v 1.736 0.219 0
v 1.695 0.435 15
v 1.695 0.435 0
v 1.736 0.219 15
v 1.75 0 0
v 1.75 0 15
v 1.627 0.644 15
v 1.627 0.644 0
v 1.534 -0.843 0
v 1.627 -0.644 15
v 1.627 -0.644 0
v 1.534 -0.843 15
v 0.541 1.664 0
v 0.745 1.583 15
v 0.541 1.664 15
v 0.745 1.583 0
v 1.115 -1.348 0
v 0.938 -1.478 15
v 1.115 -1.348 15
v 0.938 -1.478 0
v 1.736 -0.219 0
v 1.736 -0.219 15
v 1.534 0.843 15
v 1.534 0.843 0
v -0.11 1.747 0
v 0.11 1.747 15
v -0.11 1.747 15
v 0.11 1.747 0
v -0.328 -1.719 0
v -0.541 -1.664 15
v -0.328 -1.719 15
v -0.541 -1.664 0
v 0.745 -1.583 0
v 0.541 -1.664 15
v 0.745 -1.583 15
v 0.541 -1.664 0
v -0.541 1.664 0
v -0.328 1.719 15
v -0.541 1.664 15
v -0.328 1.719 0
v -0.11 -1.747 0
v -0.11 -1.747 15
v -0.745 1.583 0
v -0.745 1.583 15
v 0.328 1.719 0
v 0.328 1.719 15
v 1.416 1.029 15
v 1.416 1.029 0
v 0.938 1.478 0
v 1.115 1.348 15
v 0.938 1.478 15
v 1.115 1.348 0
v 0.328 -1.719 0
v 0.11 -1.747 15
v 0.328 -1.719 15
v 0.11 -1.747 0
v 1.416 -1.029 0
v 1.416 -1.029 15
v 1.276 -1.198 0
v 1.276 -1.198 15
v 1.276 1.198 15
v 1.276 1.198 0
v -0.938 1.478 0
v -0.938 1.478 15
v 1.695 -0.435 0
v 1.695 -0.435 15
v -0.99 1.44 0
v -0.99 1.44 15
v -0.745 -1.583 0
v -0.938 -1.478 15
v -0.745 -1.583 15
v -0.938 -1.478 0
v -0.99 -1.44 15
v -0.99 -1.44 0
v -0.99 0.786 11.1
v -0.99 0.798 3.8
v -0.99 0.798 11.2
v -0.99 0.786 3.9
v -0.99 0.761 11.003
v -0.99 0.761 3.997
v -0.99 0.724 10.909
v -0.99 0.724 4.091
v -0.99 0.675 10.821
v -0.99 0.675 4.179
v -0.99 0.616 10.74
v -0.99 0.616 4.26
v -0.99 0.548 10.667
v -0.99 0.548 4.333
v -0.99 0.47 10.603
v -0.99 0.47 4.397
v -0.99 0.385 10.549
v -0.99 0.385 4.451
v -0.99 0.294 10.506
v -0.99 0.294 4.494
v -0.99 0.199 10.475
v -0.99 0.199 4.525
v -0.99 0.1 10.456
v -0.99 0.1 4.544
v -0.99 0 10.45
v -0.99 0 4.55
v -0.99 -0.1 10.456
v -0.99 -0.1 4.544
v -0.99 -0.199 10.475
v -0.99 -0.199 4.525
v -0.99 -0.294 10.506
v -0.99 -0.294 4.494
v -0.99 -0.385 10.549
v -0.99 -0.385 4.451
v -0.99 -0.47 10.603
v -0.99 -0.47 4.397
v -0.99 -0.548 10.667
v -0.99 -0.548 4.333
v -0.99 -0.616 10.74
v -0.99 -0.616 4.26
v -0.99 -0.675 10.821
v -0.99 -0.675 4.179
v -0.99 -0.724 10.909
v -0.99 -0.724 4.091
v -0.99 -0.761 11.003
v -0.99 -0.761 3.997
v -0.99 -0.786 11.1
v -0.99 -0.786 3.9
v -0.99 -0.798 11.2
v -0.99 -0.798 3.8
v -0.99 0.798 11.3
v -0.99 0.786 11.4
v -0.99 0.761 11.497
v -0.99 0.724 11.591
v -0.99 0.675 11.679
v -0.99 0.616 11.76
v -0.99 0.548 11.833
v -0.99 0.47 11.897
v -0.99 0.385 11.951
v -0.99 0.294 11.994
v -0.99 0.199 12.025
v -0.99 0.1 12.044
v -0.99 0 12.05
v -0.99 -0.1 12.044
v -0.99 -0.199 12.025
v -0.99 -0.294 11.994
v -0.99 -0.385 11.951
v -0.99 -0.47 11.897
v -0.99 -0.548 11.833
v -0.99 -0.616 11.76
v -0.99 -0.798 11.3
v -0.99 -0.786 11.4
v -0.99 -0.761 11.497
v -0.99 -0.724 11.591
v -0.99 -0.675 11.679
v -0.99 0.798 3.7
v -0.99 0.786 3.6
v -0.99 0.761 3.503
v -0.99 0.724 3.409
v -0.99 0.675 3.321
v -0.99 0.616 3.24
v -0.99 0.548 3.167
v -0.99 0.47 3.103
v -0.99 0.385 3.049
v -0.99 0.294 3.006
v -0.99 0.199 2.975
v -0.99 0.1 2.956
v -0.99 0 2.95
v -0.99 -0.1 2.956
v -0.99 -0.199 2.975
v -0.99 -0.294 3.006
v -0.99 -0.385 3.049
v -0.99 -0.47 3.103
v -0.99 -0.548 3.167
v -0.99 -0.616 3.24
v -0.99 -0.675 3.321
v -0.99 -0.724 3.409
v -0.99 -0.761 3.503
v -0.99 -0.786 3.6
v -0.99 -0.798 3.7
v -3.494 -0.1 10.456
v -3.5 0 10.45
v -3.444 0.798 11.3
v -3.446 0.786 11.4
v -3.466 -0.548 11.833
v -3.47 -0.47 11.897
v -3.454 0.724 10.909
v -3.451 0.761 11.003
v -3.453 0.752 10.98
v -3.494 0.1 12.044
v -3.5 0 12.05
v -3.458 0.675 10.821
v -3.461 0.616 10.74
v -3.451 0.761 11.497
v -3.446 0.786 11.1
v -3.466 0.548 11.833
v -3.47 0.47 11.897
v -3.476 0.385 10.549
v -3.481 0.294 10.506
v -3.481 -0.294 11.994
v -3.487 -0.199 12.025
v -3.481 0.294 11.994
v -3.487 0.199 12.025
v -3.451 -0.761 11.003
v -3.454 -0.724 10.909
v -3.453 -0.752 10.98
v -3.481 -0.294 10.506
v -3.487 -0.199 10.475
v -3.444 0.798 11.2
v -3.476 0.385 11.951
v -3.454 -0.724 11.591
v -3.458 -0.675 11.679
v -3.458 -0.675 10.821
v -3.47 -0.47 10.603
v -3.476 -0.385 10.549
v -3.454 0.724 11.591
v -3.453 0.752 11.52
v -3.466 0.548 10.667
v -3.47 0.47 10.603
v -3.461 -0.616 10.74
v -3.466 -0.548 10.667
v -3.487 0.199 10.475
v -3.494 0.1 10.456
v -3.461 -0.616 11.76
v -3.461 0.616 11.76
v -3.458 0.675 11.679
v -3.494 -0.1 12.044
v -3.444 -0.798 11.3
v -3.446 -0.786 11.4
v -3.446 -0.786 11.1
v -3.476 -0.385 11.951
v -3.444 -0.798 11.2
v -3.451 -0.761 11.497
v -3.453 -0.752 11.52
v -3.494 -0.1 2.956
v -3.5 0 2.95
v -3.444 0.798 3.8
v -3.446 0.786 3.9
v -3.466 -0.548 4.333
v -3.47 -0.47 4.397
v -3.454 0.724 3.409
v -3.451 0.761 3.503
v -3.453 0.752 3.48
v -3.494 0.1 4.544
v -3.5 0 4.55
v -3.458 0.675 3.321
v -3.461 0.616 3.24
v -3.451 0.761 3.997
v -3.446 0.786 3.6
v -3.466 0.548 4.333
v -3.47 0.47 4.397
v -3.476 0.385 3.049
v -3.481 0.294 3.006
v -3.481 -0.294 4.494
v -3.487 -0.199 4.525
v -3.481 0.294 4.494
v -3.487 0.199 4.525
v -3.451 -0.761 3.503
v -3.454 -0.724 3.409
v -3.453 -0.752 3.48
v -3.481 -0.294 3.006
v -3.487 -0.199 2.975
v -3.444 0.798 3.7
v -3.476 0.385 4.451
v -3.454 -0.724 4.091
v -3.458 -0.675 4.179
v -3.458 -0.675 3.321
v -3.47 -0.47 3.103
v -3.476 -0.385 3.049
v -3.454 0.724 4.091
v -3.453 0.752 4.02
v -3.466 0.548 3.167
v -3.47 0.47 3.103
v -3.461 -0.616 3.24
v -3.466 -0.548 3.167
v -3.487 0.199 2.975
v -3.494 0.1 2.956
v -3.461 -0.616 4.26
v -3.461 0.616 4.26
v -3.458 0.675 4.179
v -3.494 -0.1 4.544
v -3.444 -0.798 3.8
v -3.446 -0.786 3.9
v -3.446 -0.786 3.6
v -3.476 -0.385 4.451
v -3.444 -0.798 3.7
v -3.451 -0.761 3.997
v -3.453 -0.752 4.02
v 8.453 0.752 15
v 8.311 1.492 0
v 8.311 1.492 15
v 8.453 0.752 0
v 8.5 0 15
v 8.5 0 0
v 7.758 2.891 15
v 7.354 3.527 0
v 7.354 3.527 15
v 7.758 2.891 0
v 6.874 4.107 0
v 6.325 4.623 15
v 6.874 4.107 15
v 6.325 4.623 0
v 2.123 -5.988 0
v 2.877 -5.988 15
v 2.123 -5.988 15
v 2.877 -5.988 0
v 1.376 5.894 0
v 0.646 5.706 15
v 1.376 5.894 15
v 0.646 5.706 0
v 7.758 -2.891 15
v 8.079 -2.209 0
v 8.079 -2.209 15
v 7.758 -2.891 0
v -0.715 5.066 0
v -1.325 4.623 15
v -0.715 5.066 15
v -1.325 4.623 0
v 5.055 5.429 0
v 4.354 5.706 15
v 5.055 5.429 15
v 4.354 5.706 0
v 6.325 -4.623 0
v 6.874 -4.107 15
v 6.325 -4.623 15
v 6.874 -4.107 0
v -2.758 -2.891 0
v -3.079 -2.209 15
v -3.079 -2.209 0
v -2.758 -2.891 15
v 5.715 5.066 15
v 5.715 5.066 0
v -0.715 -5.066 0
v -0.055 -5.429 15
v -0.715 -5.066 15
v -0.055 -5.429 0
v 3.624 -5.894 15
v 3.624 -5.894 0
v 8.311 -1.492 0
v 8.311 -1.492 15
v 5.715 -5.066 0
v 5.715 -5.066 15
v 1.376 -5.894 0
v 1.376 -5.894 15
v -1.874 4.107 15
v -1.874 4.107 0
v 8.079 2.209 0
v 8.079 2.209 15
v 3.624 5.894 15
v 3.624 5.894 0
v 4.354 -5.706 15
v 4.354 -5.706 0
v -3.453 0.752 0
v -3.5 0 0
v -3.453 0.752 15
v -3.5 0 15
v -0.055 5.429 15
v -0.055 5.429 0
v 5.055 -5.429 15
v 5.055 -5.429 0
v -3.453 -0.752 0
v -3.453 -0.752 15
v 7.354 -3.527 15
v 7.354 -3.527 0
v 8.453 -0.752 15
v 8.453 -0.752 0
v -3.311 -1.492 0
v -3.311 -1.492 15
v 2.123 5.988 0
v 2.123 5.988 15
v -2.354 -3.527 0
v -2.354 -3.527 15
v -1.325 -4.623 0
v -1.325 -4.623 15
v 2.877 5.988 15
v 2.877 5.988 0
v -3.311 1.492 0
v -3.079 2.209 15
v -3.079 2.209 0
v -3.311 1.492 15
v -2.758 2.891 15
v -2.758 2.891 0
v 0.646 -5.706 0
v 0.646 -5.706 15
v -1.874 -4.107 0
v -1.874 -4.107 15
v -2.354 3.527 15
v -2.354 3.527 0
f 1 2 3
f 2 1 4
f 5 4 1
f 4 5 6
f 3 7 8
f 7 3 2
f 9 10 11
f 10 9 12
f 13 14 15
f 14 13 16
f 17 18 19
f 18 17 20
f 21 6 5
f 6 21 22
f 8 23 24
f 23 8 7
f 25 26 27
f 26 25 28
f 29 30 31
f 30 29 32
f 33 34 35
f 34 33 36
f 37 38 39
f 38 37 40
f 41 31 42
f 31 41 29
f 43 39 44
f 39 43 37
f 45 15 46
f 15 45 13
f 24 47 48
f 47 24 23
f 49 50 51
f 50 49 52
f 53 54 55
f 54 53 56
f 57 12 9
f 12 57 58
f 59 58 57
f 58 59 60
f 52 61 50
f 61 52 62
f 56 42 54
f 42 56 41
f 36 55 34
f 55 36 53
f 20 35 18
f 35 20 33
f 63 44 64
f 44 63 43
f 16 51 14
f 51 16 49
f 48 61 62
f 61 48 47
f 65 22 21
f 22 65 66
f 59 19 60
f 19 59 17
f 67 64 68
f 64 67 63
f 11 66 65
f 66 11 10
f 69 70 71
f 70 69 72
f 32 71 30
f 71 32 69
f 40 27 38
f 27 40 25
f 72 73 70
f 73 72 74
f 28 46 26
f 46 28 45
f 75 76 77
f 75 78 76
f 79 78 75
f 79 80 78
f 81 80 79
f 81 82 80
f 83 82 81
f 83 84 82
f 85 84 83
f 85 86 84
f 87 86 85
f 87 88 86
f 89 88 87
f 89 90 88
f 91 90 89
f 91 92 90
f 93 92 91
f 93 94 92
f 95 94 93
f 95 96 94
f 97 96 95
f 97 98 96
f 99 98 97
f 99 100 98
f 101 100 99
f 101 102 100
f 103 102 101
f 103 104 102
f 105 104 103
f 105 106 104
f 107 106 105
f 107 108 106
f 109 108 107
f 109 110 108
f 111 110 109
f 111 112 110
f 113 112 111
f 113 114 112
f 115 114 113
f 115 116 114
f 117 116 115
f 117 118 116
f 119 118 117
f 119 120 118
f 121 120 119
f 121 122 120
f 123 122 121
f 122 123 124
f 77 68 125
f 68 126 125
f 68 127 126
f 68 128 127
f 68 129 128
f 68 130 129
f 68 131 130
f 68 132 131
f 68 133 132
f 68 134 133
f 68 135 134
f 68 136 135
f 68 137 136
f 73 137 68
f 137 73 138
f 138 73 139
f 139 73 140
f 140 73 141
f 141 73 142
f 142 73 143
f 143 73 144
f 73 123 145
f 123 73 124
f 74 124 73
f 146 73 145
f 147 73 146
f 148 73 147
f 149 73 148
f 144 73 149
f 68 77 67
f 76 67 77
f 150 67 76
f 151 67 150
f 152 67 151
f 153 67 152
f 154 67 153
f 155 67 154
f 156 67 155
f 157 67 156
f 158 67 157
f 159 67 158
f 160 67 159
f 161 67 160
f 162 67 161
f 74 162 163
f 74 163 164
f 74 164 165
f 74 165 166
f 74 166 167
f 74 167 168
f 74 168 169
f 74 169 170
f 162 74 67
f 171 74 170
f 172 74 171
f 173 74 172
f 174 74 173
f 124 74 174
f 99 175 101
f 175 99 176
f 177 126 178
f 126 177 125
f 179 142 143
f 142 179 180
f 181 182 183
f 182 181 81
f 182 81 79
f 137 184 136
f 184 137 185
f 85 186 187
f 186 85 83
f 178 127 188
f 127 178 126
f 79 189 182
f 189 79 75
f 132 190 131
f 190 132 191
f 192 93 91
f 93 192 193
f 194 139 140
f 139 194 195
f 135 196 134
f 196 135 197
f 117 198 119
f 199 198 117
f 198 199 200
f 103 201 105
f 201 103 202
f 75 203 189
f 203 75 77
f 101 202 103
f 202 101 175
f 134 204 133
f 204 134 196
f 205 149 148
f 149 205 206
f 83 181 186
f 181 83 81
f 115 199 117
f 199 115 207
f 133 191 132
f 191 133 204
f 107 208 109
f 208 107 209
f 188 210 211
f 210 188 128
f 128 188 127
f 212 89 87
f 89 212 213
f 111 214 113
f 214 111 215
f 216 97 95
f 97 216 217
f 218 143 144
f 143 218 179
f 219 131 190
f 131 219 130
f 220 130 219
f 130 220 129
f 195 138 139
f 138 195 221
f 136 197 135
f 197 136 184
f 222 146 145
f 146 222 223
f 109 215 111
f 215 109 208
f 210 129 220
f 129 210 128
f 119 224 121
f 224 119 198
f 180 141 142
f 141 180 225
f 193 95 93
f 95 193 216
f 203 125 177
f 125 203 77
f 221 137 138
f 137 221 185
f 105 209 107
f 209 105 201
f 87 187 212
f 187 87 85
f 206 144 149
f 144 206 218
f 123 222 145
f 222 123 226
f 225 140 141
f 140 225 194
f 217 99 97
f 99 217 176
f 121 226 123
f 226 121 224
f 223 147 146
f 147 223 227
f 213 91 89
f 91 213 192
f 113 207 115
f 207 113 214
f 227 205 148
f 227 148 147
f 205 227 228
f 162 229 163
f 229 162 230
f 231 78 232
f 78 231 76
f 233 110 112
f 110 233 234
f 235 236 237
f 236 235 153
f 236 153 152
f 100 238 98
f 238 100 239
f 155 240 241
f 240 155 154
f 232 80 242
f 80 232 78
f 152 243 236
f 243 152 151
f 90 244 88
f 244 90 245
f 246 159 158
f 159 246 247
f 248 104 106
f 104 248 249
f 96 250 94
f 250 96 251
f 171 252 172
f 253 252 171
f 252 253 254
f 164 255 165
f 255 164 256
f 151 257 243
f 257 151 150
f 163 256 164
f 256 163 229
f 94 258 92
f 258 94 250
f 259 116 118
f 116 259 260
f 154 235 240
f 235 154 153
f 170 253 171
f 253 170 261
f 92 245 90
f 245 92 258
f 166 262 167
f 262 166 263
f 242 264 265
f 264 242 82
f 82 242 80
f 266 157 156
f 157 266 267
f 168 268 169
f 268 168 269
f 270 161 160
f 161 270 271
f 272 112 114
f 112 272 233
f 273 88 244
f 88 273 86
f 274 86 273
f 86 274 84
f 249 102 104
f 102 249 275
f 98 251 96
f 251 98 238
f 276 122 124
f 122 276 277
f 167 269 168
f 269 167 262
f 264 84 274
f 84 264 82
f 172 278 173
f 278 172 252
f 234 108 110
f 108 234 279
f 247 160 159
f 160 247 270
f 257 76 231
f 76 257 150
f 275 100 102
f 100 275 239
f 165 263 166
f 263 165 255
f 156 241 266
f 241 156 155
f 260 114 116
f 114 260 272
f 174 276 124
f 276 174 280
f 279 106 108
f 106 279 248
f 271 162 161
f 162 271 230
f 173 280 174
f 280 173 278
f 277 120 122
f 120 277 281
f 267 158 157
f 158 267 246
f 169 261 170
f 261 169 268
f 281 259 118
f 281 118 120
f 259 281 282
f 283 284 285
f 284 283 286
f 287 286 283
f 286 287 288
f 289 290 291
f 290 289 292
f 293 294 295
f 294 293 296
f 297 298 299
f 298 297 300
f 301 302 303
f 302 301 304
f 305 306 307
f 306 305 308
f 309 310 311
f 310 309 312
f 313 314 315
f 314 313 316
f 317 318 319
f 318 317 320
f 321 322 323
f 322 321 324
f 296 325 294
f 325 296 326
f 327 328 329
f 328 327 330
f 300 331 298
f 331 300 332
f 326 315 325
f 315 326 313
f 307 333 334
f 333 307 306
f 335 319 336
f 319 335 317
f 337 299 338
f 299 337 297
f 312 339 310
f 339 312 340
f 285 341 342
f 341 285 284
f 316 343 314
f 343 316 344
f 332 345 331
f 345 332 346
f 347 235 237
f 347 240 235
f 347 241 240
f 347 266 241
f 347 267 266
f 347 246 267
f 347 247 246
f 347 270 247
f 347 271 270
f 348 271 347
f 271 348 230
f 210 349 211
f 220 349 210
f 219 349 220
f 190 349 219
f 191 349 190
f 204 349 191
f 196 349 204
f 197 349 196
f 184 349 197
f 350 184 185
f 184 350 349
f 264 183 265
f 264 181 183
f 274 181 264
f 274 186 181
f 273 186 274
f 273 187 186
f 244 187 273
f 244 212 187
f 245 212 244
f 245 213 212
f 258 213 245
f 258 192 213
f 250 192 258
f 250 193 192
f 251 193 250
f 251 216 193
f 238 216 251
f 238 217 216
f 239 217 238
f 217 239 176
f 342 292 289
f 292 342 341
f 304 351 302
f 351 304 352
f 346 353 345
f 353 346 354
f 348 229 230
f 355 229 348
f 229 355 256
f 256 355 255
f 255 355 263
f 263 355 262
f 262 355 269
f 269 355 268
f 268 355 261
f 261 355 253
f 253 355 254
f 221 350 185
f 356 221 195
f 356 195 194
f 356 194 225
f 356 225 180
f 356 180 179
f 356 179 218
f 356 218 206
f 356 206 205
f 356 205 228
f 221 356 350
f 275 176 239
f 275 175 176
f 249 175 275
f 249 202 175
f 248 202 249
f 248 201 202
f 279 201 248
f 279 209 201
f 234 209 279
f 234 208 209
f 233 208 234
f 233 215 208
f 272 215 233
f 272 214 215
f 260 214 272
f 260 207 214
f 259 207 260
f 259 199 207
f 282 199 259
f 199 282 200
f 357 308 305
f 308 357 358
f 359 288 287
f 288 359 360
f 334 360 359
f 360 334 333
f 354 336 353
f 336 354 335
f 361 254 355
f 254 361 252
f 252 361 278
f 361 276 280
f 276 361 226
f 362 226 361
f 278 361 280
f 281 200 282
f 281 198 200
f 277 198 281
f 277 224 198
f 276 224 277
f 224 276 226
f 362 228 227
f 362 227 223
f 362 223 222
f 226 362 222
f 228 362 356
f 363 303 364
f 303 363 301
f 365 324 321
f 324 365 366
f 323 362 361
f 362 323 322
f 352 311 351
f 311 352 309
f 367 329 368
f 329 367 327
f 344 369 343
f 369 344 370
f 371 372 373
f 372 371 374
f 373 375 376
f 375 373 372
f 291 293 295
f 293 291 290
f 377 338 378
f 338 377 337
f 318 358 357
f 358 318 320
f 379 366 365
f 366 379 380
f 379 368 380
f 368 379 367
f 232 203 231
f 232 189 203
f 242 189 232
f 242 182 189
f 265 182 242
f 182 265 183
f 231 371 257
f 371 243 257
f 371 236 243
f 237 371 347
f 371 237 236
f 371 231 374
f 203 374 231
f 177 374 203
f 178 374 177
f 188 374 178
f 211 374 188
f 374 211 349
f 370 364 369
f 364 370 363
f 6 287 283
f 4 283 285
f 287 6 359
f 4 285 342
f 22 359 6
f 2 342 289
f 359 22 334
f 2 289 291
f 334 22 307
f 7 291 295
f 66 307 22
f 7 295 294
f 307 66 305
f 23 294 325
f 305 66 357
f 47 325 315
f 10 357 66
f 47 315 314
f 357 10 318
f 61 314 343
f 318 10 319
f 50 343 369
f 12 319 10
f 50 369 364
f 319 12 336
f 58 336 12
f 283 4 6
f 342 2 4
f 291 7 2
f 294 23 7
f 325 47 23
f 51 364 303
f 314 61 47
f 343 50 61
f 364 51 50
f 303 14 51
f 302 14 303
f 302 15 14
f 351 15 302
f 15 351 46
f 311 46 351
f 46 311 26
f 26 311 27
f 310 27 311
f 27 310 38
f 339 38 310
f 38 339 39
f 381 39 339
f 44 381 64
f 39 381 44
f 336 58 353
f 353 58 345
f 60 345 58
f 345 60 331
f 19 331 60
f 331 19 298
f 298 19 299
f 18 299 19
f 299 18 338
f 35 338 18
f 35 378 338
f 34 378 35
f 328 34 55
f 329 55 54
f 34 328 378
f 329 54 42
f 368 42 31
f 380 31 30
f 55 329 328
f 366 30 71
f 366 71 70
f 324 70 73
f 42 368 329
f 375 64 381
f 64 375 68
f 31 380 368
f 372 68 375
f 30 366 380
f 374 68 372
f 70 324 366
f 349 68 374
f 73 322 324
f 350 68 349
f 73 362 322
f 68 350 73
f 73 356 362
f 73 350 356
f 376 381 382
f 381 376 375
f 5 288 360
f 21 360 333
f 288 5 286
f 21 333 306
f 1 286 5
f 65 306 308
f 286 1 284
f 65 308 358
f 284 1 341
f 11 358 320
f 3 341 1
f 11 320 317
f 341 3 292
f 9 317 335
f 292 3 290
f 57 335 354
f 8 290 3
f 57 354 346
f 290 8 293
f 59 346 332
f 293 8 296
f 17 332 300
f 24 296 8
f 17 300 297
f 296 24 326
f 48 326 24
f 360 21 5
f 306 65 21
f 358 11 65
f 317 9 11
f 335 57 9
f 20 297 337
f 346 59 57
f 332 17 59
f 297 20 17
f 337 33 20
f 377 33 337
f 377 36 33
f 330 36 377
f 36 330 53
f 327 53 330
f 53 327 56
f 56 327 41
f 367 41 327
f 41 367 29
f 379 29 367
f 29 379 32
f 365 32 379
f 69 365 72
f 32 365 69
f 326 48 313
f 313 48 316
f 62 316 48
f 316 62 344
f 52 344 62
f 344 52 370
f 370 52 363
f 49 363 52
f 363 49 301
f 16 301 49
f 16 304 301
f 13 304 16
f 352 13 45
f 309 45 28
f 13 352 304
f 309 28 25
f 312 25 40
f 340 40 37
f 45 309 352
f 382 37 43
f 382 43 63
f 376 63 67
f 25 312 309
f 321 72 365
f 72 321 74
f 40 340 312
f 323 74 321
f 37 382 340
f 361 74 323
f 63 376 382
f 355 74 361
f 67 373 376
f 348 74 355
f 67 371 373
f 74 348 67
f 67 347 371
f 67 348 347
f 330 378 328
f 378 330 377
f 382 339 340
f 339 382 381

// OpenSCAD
//=============================
//  Eccentric shaft adapter for 3mm motor shaft
//      Designed for Pololu micro gear motors or any 3mm motor shaft
//
//  Designed by Andrew Moore, May 2016
//      http://www.thingiverse.com/TacPar
//
//      For questions, suggestions, or whatever, 
//      please PM me through thingiverse.
//
//      This work is licensed under a Creative Commons 
//      Attribution-ShareAlike 4.0 International License.
//      http://creativecommons.org/licenses/by-sa/4.0/


//=============================
//Constants
//=============================
inch = 25.4;

//=============================
//Render Variables
//=============================
$fn=50;


//=============================
//Mechanical Part Variables
//=============================
Eccentricity = 2.5; //set to 0 if you just want a big wheel.
                    //set for 5mm stroke 
                    //1mm eccentricity = 2mm stroke
                    //2mm = 4mm stroke
                    //3mm = 6mm stroke
Body_Dia = 12;
Body_Height = 15;
Shaft_Dia = 3;
Shaft_Tolerance = 0.25; //oversized radius for motor shaft hole
Key_Depth = .17; //how deep keyed cut is in motor shaft; default 20% = 0.2

//Sanity Checks on Dimensions... right now this error checking is not actually used for anything.
Dimension_Error = false;
if (Shaft_Tolerance >1)or (Body_Dia-(Shaft_Dia+Shaft_Tolerance+Eccentricity)<1)
{
    Dimension_Error = true;
}


module 3mmShaftAdapter()
{
	
	difference()
	{
		positives();
		negatives();
	}
	//add ons in areas that were erased...
	
	module positives()
	{
        translate([Eccentricity,0,Body_Height/2]) cylinder(r=Body_Dia/2, h=Body_Height, center=true);
	}

	module negatives()
	{


		//keyed shaft
		translate([0,0,0.1]) difference()
		{
			cylinder(r=Shaft_Dia/2+Shaft_Tolerance, h=2*Body_Height,  center=true);
			translate([(Key_Depth-1)*Shaft_Dia,0,0]) cube([Shaft_Dia,Shaft_Dia,2*Body_Height], center=true);
		}
		
		//set-screw holes at 25% and 75% of overall length
		translate([0,0,0.75*Body_Height]) rotate([0,-90,0])cylinder(r=.8, h=2*Body_Height);
        translate([0,0,0.25*Body_Height]) rotate([0,-90,0])cylinder(r=.8, h=2*Body_Height);
	}

}


3mmShaftAdapter();
